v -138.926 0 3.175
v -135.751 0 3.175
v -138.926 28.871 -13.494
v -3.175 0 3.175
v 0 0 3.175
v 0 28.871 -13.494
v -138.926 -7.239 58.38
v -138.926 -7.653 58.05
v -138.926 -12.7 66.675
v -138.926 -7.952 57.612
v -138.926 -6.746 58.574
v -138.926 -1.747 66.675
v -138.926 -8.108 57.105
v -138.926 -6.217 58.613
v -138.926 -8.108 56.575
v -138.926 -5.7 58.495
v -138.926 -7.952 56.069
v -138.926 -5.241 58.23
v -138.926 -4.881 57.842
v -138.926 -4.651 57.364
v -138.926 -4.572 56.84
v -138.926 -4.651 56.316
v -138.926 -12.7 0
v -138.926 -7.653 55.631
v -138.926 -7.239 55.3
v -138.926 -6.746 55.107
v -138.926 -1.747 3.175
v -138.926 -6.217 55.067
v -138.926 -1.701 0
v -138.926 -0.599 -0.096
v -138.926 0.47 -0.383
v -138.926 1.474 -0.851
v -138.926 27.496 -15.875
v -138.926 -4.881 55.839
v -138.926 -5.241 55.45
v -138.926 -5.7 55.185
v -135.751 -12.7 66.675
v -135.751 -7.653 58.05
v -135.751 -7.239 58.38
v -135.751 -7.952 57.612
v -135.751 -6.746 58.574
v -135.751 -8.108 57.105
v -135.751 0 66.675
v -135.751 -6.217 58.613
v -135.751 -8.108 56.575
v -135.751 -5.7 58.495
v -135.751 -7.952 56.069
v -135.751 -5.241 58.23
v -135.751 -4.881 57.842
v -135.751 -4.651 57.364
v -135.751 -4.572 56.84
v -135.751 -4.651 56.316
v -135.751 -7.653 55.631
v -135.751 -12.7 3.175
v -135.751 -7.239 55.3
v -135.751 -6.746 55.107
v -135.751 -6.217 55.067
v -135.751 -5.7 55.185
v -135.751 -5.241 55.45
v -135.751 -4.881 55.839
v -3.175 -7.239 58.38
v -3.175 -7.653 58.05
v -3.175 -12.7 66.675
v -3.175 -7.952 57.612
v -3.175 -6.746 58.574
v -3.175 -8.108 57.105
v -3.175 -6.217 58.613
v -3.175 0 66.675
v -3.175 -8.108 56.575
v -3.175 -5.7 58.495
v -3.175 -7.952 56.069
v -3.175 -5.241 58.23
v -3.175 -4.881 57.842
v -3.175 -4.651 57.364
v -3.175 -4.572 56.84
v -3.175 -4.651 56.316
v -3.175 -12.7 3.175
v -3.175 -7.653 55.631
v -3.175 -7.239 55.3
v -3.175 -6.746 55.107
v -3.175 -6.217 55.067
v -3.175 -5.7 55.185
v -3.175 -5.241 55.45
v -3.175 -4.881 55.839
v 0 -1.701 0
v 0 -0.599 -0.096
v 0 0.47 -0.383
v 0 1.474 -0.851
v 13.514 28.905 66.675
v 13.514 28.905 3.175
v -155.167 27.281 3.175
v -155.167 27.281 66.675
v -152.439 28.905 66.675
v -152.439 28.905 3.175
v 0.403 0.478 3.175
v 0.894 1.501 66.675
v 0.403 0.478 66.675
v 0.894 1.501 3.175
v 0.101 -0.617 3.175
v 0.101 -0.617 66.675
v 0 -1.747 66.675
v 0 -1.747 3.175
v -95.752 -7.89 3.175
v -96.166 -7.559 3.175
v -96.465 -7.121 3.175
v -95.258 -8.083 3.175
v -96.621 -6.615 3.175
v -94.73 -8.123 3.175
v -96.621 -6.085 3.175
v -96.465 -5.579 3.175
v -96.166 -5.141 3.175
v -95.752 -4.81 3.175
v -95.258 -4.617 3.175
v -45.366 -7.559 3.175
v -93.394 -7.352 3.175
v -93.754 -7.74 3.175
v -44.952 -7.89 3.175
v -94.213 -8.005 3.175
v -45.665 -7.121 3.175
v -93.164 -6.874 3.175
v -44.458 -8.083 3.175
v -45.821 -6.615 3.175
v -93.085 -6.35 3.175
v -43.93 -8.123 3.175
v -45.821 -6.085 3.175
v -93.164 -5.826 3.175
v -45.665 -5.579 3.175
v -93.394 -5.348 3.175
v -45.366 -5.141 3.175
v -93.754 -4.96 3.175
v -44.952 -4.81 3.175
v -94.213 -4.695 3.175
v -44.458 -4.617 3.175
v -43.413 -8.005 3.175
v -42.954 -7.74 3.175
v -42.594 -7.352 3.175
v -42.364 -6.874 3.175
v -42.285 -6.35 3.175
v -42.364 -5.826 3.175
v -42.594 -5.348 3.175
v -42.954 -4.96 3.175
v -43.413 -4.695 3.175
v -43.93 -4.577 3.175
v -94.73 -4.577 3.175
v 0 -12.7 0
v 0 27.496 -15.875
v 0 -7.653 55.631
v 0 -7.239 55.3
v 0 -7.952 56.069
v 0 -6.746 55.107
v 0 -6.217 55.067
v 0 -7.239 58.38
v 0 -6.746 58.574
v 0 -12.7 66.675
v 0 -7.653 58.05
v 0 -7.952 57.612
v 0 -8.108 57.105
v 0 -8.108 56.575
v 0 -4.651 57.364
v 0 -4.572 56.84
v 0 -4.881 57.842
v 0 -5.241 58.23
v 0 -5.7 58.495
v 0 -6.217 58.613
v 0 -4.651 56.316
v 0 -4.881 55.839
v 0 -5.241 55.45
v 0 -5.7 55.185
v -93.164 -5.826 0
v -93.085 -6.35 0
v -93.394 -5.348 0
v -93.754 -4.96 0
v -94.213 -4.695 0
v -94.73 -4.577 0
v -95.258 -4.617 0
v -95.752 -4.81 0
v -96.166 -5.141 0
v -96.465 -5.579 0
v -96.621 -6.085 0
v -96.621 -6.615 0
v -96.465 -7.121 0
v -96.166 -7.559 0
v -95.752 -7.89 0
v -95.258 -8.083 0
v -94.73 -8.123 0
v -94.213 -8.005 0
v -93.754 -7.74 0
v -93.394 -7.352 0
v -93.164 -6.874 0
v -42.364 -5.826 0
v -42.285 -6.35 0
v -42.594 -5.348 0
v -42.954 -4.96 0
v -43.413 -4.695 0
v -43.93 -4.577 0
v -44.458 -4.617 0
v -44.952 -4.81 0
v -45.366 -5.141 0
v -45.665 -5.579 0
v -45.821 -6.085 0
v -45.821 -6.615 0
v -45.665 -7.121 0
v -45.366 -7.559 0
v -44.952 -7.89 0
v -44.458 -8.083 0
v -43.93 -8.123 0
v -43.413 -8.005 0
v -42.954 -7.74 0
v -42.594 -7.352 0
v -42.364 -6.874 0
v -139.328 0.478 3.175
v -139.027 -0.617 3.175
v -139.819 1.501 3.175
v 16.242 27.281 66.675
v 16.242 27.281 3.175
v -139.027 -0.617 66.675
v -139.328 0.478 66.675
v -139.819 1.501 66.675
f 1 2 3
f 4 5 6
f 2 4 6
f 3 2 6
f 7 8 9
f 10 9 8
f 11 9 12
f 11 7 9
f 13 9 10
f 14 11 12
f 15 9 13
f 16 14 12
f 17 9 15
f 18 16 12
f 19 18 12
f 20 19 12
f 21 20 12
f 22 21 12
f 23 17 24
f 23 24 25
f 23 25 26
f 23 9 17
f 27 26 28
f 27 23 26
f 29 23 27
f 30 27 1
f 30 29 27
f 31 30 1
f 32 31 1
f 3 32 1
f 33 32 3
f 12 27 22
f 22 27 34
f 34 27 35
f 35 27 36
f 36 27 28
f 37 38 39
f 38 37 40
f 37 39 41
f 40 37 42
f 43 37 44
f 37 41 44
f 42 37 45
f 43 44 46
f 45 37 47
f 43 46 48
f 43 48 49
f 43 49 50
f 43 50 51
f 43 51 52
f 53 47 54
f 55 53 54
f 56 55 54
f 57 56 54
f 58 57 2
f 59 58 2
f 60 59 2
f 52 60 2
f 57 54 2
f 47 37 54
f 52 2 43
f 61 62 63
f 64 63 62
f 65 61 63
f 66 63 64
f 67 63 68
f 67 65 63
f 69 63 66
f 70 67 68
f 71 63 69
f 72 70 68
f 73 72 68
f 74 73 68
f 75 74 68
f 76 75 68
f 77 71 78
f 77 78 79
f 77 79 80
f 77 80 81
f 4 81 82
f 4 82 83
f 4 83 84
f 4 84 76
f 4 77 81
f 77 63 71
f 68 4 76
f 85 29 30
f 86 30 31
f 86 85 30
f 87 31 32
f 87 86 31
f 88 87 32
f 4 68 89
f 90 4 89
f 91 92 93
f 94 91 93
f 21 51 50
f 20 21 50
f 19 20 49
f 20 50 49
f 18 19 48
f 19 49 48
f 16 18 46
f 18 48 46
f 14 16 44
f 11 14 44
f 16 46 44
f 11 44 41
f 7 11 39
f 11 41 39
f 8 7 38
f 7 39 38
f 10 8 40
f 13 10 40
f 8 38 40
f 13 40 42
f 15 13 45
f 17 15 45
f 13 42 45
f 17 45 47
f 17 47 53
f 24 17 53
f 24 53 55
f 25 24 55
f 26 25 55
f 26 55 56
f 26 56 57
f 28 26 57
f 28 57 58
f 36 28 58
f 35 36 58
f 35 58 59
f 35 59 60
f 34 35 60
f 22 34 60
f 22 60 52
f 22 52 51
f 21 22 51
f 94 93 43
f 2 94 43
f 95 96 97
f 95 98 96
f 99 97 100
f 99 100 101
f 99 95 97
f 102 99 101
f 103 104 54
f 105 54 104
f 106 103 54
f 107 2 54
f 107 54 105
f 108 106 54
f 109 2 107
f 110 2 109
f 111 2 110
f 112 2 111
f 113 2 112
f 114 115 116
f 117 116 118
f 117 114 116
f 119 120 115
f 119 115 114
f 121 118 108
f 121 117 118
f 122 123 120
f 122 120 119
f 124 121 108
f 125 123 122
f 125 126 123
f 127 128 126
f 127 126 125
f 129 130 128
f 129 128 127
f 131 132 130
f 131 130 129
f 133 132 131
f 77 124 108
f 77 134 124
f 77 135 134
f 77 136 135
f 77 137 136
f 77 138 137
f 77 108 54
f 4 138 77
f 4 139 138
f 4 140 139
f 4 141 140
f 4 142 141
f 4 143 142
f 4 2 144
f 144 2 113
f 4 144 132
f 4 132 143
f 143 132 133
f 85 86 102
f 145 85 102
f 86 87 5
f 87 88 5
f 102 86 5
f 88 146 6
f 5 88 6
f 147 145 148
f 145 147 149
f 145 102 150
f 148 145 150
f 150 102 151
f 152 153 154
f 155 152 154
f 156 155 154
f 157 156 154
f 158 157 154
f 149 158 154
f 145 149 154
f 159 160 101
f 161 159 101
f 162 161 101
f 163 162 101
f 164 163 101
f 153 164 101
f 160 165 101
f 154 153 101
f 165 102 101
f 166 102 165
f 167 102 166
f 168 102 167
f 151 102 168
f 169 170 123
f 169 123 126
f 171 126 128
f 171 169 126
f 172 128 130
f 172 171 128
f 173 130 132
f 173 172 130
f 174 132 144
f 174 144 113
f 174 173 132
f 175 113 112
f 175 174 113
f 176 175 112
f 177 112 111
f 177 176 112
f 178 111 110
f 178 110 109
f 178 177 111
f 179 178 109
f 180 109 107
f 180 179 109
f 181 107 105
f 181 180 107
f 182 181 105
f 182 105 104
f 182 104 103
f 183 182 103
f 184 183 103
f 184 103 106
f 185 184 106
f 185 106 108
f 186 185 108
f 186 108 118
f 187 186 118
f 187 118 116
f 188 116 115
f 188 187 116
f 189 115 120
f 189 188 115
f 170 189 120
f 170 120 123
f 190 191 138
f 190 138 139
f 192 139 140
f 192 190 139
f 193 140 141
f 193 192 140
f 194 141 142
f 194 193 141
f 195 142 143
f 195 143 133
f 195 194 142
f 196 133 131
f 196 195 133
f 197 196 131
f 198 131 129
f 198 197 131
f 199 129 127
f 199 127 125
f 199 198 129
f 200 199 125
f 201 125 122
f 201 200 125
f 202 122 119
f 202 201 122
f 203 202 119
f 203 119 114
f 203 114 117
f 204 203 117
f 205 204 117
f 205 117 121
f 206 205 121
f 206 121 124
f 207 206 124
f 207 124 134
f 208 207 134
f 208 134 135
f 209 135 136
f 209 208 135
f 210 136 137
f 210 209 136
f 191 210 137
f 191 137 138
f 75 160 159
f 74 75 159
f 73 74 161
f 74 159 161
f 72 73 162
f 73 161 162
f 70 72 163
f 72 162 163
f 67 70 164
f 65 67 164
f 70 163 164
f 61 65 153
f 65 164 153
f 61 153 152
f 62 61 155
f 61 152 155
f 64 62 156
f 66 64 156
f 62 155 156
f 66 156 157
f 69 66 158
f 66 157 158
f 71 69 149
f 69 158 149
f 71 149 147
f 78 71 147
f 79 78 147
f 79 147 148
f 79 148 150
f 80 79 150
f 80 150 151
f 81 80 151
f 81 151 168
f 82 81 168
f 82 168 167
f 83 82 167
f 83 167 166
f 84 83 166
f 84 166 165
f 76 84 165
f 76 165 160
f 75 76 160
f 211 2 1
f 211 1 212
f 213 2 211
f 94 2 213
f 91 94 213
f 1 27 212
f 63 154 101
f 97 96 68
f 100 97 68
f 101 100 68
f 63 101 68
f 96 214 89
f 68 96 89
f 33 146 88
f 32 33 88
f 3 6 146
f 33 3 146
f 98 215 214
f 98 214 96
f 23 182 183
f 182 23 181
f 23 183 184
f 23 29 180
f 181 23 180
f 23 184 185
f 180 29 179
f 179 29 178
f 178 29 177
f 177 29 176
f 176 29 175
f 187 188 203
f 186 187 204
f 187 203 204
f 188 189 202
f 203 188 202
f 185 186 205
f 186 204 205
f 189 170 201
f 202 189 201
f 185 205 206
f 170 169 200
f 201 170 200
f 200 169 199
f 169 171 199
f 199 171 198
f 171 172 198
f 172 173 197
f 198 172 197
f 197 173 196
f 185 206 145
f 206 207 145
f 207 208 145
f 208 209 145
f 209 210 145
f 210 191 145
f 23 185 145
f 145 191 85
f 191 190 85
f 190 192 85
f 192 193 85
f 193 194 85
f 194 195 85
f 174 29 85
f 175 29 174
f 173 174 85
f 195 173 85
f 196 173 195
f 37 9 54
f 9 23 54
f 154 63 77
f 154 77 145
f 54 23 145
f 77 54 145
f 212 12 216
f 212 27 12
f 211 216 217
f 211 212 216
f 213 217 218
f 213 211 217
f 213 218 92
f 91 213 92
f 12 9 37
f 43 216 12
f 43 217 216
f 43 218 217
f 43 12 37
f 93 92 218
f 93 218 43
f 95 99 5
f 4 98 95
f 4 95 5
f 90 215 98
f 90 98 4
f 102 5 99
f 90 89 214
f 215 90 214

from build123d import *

# Parameters (mm, degrees)
SKETCH1_W           = 138.92560988
SKETCH1_H           = 12.7
SKETCH1_R           = 1.778
BOSS_EXTRUDE1_DEPTH = 3.175
SKETCH2_W           = 3.175
SKETCH2_H           = 12.7
BOSS_EXTRUDE2_DEPTH = 63.5
SKETCH3_R           = 1.778
CUT_EXTRUDE1_DEPTH  = 152.4
BOSS_EXTRUDE3_REACH = 156.619
BOSS_EXTRUDE4_DEPTH = 63.5
FILLET1_R           = 6.35


with BuildPart() as part:
    # Sketch1 → Boss-Extrude1 (new body)
    with BuildSketch(Plane.XY):
        with Locations((-69.46280494, -6.35)):
            Rectangle(SKETCH1_W, SKETCH1_H)
        with Locations((-94.86280494, -6.35)):
            Circle(SKETCH1_R, mode=Mode.SUBTRACT)
        with Locations((-44.06280494, -6.35)):
            Circle(SKETCH1_R, mode=Mode.SUBTRACT)
    extrude(amount=BOSS_EXTRUDE1_DEPTH)

    # Sketch2 → Boss-Extrude2 (add)
    with BuildSketch(Plane.XY.offset(3.175)):
        with Locations((-137.33810988, -6.35)):
            Rectangle(SKETCH2_W, SKETCH2_H)
        with Locations((-1.5875, -6.35)):
            Rectangle(SKETCH2_W, SKETCH2_H)
    extrude(amount=BOSS_EXTRUDE2_DEPTH)

    # Sketch3 → Cut-Extrude1 (cut)
    with BuildSketch(Plane(origin=(0, 0, 0), x_dir=(0, 0, -1), z_dir=(1, 0, 0))):
        with Locations(Location((-56.840236332, -6.35, 0), (0, 0, 90))):
            Circle(SKETCH3_R)
    extrude(amount=-CUT_EXTRUDE1_DEPTH, mode=Mode.SUBTRACT)

    # Boss-Extrude3: up to this face of the body (flat: up to its plane)
    boss_extrude3_end = Plane(part.part.faces().sort_by_distance((-138.92560988, -6.35, 33.058574097))[0])
    # Sketch5 → Boss-Extrude3 (add, up to the picked face)
    with BuildSketch(Plane(origin=(0, 0, 0), x_dir=(0, 0, -1), z_dir=(1, 0, 0)), mode=Mode.PRIVATE) as boss_extrude3_sk1:
        Polygon((-3.175, 0), (13.49375, 28.871121899), (15.875, 27.49630657), (0, 0), align=None)
    boss_extrude3_tool1 = split(extrude(boss_extrude3_sk1.sketch, amount=-BOSS_EXTRUDE3_REACH, mode=Mode.PRIVATE), bisect_by=boss_extrude3_end, keep=Keep.BOTH, mode=Mode.PRIVATE)
    add(boss_extrude3_tool1.solids().sort_by(Axis((0, 14.094651, -6.537144), (-1, 0, 0)))[0])

    # Sketch6 → Boss-Extrude4 (add)
    with BuildSketch(Plane.XY.offset(66.675)):
        Polygon((-3.175, 0), (13.513581363, 28.905470827), (16.241711333, 27.281299694), (0, 0), align=None)
        Polygon((-138.92560988, 0), (-155.167321213, 27.281299694), (-152.439191243, 28.905470827), (-135.75060988, 0), align=None)
    extrude(amount=-BOSS_EXTRUDE4_DEPTH)

    # Fillet1
    fillet1_edges = [part.edges().sort_by_distance(p)[0] for p in [
        (-69.46280494, 0, 0),
        (-138.92560988, 0, 34.925),
        (0, 0, 34.925),
    ]]
    fillet(fillet1_edges, radius=FILLET1_R)


solid = part.part
